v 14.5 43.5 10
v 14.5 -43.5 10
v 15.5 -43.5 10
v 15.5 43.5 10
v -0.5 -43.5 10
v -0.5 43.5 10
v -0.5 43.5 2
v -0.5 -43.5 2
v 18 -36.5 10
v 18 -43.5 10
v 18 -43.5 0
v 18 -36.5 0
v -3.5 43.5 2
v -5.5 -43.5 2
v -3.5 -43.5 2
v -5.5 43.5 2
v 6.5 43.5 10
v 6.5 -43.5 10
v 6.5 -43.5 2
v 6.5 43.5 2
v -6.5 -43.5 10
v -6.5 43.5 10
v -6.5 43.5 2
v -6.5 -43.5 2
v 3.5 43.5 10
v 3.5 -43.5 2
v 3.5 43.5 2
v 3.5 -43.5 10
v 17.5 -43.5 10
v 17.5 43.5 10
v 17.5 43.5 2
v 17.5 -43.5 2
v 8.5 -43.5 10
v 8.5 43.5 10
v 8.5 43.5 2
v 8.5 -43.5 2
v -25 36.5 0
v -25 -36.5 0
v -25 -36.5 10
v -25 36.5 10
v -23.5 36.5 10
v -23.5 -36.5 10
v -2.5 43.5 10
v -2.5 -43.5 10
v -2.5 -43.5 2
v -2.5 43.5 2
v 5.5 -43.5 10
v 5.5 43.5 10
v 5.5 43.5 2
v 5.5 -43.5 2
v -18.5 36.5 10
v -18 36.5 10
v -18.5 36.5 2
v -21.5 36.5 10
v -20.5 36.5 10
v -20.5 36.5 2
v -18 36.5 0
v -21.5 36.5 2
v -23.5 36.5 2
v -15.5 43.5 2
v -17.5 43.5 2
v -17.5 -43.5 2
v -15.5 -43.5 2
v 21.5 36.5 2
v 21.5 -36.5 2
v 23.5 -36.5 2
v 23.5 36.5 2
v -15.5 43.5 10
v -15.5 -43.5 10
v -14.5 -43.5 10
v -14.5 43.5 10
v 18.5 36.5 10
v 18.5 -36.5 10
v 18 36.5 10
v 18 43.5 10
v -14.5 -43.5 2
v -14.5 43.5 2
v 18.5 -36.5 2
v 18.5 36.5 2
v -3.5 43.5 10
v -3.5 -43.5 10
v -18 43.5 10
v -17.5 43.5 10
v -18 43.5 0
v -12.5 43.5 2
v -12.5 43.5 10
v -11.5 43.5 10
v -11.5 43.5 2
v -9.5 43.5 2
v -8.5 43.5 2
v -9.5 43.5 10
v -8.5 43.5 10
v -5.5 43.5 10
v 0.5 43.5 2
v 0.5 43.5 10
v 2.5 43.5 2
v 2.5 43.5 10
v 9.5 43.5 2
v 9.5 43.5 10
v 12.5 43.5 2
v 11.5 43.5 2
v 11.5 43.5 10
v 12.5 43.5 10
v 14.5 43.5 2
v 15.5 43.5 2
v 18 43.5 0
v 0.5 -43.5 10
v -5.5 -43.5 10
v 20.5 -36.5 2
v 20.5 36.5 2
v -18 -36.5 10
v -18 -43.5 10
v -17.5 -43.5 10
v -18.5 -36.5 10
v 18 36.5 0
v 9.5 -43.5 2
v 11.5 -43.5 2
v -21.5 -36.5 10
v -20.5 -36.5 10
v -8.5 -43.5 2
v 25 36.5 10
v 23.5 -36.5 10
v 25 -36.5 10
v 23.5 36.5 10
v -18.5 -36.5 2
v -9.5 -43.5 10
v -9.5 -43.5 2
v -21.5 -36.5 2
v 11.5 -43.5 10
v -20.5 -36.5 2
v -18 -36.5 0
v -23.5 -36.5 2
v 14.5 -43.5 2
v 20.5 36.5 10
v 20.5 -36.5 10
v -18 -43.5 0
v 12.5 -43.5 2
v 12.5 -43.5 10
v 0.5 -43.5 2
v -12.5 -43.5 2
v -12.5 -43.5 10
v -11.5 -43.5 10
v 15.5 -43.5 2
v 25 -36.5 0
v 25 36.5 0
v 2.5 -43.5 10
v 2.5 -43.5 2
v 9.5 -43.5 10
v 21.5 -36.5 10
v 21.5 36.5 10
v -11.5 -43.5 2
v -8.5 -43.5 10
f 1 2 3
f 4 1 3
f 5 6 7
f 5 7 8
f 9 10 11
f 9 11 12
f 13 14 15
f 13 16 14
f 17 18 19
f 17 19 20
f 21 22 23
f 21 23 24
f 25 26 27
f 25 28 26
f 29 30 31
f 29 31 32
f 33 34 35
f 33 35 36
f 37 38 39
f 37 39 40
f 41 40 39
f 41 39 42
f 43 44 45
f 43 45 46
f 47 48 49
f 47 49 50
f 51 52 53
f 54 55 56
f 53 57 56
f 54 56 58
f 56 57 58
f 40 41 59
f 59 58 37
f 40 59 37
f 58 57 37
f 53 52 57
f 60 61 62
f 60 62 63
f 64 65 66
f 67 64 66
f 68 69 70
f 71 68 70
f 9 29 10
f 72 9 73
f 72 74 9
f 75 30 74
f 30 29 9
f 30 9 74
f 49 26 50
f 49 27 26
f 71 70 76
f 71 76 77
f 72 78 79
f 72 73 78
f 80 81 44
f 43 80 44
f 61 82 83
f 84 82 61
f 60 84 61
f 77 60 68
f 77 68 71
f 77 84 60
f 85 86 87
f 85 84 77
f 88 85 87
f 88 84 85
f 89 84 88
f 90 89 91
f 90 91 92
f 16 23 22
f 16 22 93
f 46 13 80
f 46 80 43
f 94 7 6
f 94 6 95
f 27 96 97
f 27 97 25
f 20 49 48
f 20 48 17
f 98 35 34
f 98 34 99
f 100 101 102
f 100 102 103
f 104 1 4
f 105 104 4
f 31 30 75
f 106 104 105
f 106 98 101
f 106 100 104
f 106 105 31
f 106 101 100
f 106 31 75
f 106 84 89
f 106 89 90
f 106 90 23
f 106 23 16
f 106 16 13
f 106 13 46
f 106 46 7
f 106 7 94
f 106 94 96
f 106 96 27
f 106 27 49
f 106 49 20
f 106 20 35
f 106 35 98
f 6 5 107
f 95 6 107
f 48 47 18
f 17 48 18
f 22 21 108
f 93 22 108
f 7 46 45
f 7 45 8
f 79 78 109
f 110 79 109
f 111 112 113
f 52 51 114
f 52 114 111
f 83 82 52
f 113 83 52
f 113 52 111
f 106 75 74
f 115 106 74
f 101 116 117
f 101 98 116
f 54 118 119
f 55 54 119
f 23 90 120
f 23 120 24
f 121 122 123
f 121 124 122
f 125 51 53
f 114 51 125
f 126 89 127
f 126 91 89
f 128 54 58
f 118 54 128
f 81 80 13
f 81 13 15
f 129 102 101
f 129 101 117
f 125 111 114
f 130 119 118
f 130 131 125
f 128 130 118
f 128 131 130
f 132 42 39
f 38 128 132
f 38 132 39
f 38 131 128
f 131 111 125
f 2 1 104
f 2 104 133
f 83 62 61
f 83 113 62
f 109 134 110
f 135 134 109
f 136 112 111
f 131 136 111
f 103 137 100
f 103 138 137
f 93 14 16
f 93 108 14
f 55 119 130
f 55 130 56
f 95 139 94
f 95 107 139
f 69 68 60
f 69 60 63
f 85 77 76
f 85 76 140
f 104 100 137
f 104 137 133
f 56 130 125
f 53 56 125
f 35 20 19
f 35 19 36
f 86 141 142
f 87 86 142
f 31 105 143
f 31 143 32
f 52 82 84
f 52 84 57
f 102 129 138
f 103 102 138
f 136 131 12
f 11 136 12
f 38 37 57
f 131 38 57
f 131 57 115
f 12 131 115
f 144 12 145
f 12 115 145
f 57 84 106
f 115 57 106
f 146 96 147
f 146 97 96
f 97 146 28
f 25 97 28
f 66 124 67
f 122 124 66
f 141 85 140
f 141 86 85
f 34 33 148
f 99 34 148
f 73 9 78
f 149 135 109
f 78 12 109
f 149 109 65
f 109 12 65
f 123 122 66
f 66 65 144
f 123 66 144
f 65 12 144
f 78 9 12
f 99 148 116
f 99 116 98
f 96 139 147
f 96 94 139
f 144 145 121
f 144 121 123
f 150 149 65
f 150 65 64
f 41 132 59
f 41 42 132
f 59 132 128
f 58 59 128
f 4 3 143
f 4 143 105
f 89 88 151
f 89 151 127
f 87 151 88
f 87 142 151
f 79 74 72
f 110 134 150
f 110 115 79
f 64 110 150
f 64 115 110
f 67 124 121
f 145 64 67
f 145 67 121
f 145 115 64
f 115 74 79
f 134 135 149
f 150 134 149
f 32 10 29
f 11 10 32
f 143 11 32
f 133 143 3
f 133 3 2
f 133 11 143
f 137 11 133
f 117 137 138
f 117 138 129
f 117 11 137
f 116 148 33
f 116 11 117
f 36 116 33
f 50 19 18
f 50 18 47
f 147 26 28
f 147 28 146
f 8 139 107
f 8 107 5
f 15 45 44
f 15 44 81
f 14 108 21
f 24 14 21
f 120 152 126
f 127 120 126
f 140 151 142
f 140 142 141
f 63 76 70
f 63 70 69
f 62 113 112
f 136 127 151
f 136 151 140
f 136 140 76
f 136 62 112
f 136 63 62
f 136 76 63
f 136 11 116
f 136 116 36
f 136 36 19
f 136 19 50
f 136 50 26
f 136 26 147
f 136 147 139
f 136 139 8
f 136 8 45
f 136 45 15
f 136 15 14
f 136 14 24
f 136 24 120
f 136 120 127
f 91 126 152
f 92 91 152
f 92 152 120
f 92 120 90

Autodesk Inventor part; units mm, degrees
ref_plane "YZ Plane" through (0, 0, 0) normal (1, 0, 0) x (0, 1, 0)
ref_plane "XZ Plane" through (0, 0, 0) normal (0, 1, 0) x (-1, 0, 0)
ref_plane "XY Plane" through (0, 0, 0) normal (0, 0, 1) x (1, 0, 0)
sketch "Skizze1" plane through (0, 0, 0) normal (0, 0, 1) x (1, 0, 0)
  line L0 (-18, 43.5) -> (18, 43.5)
  line L1 (25, 36.5) -> (25, -36.5)
  line L2 (18, -43.5) -> (-18, -43.5)
  line L3 (-25, -36.5) -> (-25, 36.5)
  line L4 (-18, 43.5) -> (-18, 36.5)
  line L5 (-18, 36.5) -> (-25, 36.5)
  line L6 (18, 43.5) -> (18, 36.5)
  line L7 (18, 36.5) -> (25, 36.5)
  line L8 (-18, -43.5) -> (-18, -36.5)
  line L9 (-18, -36.5) -> (-25, -36.5)
  line L10 (18, -43.5) -> (18, -36.5)
  line L11 (18, -36.5) -> (25, -36.5)
  line L12 (0, 60.9) -> (0, -60.9) projected
  line L13 (-35, 0) -> (35, 0) projected
  point P0 (0, 0)
  dimension "d6" = 87
  dimension "d7" = 50
  dimension "d8" = 7
  dimension "d9" = 7
extrude "Extrusion1" add sketch "Skizze1" along normal blind 10
sketch "Skizze2" plane through (0, 0, 10) normal (0, 0, 1) x (1, 0, 0)
  line L0 (-18, -43.5) -> (18, -43.5) projected
  line L1 (18, -43.5) -> (18, -36.5) projected
  line L2 (18, -36.5) -> (25, -36.5) projected
  line L3 (25, -36.5) -> (25, 36.5) projected
  line L4 (25, 36.5) -> (18, 36.5) projected
  line L5 (18, 36.5) -> (18, 43.5) projected
  line L6 (18, 43.5) -> (-18, 43.5) projected
  line L7 (-18, 43.5) -> (-18, 36.5) projected
  line L8 (-18, 36.5) -> (-25, 36.5) projected
  line L9 (-25, 36.5) -> (-25, -36.5) projected
  line L10 (-25, -36.5) -> (-18, -36.5) projected
  line L11 (-18, -36.5) -> (-18, -43.5) projected
  line L12 (-23.5, 43.5) -> (-21.5, 43.5)
  line L13 (-21.5, 43.5) -> (-21.5, -43.5)
  line L14 (-21.5, -43.5) -> (-23.5, -43.5)
  line L15 (-23.5, -43.5) -> (-23.5, 43.5)
  line L16 (-18, -43.5) -> (18, -43.5) projected
  point P0 (0, 0)
  dimension "d12" = 1.5
  dimension "d13" = 2
extrude "Extrusion2" cut sketch "Skizze2" against normal blind 8 contours L13 L14 L15 L10 | L10 L15 L8 L13 | L8 L15 L12 L13
pattern_linear "Rechteckige Anordnung1" count 16 spacing 3 along (1, 0, 0) of "Extrusion2"
properties part number "Jetson Kühlkörper Original" material "Aluminium 6061"
